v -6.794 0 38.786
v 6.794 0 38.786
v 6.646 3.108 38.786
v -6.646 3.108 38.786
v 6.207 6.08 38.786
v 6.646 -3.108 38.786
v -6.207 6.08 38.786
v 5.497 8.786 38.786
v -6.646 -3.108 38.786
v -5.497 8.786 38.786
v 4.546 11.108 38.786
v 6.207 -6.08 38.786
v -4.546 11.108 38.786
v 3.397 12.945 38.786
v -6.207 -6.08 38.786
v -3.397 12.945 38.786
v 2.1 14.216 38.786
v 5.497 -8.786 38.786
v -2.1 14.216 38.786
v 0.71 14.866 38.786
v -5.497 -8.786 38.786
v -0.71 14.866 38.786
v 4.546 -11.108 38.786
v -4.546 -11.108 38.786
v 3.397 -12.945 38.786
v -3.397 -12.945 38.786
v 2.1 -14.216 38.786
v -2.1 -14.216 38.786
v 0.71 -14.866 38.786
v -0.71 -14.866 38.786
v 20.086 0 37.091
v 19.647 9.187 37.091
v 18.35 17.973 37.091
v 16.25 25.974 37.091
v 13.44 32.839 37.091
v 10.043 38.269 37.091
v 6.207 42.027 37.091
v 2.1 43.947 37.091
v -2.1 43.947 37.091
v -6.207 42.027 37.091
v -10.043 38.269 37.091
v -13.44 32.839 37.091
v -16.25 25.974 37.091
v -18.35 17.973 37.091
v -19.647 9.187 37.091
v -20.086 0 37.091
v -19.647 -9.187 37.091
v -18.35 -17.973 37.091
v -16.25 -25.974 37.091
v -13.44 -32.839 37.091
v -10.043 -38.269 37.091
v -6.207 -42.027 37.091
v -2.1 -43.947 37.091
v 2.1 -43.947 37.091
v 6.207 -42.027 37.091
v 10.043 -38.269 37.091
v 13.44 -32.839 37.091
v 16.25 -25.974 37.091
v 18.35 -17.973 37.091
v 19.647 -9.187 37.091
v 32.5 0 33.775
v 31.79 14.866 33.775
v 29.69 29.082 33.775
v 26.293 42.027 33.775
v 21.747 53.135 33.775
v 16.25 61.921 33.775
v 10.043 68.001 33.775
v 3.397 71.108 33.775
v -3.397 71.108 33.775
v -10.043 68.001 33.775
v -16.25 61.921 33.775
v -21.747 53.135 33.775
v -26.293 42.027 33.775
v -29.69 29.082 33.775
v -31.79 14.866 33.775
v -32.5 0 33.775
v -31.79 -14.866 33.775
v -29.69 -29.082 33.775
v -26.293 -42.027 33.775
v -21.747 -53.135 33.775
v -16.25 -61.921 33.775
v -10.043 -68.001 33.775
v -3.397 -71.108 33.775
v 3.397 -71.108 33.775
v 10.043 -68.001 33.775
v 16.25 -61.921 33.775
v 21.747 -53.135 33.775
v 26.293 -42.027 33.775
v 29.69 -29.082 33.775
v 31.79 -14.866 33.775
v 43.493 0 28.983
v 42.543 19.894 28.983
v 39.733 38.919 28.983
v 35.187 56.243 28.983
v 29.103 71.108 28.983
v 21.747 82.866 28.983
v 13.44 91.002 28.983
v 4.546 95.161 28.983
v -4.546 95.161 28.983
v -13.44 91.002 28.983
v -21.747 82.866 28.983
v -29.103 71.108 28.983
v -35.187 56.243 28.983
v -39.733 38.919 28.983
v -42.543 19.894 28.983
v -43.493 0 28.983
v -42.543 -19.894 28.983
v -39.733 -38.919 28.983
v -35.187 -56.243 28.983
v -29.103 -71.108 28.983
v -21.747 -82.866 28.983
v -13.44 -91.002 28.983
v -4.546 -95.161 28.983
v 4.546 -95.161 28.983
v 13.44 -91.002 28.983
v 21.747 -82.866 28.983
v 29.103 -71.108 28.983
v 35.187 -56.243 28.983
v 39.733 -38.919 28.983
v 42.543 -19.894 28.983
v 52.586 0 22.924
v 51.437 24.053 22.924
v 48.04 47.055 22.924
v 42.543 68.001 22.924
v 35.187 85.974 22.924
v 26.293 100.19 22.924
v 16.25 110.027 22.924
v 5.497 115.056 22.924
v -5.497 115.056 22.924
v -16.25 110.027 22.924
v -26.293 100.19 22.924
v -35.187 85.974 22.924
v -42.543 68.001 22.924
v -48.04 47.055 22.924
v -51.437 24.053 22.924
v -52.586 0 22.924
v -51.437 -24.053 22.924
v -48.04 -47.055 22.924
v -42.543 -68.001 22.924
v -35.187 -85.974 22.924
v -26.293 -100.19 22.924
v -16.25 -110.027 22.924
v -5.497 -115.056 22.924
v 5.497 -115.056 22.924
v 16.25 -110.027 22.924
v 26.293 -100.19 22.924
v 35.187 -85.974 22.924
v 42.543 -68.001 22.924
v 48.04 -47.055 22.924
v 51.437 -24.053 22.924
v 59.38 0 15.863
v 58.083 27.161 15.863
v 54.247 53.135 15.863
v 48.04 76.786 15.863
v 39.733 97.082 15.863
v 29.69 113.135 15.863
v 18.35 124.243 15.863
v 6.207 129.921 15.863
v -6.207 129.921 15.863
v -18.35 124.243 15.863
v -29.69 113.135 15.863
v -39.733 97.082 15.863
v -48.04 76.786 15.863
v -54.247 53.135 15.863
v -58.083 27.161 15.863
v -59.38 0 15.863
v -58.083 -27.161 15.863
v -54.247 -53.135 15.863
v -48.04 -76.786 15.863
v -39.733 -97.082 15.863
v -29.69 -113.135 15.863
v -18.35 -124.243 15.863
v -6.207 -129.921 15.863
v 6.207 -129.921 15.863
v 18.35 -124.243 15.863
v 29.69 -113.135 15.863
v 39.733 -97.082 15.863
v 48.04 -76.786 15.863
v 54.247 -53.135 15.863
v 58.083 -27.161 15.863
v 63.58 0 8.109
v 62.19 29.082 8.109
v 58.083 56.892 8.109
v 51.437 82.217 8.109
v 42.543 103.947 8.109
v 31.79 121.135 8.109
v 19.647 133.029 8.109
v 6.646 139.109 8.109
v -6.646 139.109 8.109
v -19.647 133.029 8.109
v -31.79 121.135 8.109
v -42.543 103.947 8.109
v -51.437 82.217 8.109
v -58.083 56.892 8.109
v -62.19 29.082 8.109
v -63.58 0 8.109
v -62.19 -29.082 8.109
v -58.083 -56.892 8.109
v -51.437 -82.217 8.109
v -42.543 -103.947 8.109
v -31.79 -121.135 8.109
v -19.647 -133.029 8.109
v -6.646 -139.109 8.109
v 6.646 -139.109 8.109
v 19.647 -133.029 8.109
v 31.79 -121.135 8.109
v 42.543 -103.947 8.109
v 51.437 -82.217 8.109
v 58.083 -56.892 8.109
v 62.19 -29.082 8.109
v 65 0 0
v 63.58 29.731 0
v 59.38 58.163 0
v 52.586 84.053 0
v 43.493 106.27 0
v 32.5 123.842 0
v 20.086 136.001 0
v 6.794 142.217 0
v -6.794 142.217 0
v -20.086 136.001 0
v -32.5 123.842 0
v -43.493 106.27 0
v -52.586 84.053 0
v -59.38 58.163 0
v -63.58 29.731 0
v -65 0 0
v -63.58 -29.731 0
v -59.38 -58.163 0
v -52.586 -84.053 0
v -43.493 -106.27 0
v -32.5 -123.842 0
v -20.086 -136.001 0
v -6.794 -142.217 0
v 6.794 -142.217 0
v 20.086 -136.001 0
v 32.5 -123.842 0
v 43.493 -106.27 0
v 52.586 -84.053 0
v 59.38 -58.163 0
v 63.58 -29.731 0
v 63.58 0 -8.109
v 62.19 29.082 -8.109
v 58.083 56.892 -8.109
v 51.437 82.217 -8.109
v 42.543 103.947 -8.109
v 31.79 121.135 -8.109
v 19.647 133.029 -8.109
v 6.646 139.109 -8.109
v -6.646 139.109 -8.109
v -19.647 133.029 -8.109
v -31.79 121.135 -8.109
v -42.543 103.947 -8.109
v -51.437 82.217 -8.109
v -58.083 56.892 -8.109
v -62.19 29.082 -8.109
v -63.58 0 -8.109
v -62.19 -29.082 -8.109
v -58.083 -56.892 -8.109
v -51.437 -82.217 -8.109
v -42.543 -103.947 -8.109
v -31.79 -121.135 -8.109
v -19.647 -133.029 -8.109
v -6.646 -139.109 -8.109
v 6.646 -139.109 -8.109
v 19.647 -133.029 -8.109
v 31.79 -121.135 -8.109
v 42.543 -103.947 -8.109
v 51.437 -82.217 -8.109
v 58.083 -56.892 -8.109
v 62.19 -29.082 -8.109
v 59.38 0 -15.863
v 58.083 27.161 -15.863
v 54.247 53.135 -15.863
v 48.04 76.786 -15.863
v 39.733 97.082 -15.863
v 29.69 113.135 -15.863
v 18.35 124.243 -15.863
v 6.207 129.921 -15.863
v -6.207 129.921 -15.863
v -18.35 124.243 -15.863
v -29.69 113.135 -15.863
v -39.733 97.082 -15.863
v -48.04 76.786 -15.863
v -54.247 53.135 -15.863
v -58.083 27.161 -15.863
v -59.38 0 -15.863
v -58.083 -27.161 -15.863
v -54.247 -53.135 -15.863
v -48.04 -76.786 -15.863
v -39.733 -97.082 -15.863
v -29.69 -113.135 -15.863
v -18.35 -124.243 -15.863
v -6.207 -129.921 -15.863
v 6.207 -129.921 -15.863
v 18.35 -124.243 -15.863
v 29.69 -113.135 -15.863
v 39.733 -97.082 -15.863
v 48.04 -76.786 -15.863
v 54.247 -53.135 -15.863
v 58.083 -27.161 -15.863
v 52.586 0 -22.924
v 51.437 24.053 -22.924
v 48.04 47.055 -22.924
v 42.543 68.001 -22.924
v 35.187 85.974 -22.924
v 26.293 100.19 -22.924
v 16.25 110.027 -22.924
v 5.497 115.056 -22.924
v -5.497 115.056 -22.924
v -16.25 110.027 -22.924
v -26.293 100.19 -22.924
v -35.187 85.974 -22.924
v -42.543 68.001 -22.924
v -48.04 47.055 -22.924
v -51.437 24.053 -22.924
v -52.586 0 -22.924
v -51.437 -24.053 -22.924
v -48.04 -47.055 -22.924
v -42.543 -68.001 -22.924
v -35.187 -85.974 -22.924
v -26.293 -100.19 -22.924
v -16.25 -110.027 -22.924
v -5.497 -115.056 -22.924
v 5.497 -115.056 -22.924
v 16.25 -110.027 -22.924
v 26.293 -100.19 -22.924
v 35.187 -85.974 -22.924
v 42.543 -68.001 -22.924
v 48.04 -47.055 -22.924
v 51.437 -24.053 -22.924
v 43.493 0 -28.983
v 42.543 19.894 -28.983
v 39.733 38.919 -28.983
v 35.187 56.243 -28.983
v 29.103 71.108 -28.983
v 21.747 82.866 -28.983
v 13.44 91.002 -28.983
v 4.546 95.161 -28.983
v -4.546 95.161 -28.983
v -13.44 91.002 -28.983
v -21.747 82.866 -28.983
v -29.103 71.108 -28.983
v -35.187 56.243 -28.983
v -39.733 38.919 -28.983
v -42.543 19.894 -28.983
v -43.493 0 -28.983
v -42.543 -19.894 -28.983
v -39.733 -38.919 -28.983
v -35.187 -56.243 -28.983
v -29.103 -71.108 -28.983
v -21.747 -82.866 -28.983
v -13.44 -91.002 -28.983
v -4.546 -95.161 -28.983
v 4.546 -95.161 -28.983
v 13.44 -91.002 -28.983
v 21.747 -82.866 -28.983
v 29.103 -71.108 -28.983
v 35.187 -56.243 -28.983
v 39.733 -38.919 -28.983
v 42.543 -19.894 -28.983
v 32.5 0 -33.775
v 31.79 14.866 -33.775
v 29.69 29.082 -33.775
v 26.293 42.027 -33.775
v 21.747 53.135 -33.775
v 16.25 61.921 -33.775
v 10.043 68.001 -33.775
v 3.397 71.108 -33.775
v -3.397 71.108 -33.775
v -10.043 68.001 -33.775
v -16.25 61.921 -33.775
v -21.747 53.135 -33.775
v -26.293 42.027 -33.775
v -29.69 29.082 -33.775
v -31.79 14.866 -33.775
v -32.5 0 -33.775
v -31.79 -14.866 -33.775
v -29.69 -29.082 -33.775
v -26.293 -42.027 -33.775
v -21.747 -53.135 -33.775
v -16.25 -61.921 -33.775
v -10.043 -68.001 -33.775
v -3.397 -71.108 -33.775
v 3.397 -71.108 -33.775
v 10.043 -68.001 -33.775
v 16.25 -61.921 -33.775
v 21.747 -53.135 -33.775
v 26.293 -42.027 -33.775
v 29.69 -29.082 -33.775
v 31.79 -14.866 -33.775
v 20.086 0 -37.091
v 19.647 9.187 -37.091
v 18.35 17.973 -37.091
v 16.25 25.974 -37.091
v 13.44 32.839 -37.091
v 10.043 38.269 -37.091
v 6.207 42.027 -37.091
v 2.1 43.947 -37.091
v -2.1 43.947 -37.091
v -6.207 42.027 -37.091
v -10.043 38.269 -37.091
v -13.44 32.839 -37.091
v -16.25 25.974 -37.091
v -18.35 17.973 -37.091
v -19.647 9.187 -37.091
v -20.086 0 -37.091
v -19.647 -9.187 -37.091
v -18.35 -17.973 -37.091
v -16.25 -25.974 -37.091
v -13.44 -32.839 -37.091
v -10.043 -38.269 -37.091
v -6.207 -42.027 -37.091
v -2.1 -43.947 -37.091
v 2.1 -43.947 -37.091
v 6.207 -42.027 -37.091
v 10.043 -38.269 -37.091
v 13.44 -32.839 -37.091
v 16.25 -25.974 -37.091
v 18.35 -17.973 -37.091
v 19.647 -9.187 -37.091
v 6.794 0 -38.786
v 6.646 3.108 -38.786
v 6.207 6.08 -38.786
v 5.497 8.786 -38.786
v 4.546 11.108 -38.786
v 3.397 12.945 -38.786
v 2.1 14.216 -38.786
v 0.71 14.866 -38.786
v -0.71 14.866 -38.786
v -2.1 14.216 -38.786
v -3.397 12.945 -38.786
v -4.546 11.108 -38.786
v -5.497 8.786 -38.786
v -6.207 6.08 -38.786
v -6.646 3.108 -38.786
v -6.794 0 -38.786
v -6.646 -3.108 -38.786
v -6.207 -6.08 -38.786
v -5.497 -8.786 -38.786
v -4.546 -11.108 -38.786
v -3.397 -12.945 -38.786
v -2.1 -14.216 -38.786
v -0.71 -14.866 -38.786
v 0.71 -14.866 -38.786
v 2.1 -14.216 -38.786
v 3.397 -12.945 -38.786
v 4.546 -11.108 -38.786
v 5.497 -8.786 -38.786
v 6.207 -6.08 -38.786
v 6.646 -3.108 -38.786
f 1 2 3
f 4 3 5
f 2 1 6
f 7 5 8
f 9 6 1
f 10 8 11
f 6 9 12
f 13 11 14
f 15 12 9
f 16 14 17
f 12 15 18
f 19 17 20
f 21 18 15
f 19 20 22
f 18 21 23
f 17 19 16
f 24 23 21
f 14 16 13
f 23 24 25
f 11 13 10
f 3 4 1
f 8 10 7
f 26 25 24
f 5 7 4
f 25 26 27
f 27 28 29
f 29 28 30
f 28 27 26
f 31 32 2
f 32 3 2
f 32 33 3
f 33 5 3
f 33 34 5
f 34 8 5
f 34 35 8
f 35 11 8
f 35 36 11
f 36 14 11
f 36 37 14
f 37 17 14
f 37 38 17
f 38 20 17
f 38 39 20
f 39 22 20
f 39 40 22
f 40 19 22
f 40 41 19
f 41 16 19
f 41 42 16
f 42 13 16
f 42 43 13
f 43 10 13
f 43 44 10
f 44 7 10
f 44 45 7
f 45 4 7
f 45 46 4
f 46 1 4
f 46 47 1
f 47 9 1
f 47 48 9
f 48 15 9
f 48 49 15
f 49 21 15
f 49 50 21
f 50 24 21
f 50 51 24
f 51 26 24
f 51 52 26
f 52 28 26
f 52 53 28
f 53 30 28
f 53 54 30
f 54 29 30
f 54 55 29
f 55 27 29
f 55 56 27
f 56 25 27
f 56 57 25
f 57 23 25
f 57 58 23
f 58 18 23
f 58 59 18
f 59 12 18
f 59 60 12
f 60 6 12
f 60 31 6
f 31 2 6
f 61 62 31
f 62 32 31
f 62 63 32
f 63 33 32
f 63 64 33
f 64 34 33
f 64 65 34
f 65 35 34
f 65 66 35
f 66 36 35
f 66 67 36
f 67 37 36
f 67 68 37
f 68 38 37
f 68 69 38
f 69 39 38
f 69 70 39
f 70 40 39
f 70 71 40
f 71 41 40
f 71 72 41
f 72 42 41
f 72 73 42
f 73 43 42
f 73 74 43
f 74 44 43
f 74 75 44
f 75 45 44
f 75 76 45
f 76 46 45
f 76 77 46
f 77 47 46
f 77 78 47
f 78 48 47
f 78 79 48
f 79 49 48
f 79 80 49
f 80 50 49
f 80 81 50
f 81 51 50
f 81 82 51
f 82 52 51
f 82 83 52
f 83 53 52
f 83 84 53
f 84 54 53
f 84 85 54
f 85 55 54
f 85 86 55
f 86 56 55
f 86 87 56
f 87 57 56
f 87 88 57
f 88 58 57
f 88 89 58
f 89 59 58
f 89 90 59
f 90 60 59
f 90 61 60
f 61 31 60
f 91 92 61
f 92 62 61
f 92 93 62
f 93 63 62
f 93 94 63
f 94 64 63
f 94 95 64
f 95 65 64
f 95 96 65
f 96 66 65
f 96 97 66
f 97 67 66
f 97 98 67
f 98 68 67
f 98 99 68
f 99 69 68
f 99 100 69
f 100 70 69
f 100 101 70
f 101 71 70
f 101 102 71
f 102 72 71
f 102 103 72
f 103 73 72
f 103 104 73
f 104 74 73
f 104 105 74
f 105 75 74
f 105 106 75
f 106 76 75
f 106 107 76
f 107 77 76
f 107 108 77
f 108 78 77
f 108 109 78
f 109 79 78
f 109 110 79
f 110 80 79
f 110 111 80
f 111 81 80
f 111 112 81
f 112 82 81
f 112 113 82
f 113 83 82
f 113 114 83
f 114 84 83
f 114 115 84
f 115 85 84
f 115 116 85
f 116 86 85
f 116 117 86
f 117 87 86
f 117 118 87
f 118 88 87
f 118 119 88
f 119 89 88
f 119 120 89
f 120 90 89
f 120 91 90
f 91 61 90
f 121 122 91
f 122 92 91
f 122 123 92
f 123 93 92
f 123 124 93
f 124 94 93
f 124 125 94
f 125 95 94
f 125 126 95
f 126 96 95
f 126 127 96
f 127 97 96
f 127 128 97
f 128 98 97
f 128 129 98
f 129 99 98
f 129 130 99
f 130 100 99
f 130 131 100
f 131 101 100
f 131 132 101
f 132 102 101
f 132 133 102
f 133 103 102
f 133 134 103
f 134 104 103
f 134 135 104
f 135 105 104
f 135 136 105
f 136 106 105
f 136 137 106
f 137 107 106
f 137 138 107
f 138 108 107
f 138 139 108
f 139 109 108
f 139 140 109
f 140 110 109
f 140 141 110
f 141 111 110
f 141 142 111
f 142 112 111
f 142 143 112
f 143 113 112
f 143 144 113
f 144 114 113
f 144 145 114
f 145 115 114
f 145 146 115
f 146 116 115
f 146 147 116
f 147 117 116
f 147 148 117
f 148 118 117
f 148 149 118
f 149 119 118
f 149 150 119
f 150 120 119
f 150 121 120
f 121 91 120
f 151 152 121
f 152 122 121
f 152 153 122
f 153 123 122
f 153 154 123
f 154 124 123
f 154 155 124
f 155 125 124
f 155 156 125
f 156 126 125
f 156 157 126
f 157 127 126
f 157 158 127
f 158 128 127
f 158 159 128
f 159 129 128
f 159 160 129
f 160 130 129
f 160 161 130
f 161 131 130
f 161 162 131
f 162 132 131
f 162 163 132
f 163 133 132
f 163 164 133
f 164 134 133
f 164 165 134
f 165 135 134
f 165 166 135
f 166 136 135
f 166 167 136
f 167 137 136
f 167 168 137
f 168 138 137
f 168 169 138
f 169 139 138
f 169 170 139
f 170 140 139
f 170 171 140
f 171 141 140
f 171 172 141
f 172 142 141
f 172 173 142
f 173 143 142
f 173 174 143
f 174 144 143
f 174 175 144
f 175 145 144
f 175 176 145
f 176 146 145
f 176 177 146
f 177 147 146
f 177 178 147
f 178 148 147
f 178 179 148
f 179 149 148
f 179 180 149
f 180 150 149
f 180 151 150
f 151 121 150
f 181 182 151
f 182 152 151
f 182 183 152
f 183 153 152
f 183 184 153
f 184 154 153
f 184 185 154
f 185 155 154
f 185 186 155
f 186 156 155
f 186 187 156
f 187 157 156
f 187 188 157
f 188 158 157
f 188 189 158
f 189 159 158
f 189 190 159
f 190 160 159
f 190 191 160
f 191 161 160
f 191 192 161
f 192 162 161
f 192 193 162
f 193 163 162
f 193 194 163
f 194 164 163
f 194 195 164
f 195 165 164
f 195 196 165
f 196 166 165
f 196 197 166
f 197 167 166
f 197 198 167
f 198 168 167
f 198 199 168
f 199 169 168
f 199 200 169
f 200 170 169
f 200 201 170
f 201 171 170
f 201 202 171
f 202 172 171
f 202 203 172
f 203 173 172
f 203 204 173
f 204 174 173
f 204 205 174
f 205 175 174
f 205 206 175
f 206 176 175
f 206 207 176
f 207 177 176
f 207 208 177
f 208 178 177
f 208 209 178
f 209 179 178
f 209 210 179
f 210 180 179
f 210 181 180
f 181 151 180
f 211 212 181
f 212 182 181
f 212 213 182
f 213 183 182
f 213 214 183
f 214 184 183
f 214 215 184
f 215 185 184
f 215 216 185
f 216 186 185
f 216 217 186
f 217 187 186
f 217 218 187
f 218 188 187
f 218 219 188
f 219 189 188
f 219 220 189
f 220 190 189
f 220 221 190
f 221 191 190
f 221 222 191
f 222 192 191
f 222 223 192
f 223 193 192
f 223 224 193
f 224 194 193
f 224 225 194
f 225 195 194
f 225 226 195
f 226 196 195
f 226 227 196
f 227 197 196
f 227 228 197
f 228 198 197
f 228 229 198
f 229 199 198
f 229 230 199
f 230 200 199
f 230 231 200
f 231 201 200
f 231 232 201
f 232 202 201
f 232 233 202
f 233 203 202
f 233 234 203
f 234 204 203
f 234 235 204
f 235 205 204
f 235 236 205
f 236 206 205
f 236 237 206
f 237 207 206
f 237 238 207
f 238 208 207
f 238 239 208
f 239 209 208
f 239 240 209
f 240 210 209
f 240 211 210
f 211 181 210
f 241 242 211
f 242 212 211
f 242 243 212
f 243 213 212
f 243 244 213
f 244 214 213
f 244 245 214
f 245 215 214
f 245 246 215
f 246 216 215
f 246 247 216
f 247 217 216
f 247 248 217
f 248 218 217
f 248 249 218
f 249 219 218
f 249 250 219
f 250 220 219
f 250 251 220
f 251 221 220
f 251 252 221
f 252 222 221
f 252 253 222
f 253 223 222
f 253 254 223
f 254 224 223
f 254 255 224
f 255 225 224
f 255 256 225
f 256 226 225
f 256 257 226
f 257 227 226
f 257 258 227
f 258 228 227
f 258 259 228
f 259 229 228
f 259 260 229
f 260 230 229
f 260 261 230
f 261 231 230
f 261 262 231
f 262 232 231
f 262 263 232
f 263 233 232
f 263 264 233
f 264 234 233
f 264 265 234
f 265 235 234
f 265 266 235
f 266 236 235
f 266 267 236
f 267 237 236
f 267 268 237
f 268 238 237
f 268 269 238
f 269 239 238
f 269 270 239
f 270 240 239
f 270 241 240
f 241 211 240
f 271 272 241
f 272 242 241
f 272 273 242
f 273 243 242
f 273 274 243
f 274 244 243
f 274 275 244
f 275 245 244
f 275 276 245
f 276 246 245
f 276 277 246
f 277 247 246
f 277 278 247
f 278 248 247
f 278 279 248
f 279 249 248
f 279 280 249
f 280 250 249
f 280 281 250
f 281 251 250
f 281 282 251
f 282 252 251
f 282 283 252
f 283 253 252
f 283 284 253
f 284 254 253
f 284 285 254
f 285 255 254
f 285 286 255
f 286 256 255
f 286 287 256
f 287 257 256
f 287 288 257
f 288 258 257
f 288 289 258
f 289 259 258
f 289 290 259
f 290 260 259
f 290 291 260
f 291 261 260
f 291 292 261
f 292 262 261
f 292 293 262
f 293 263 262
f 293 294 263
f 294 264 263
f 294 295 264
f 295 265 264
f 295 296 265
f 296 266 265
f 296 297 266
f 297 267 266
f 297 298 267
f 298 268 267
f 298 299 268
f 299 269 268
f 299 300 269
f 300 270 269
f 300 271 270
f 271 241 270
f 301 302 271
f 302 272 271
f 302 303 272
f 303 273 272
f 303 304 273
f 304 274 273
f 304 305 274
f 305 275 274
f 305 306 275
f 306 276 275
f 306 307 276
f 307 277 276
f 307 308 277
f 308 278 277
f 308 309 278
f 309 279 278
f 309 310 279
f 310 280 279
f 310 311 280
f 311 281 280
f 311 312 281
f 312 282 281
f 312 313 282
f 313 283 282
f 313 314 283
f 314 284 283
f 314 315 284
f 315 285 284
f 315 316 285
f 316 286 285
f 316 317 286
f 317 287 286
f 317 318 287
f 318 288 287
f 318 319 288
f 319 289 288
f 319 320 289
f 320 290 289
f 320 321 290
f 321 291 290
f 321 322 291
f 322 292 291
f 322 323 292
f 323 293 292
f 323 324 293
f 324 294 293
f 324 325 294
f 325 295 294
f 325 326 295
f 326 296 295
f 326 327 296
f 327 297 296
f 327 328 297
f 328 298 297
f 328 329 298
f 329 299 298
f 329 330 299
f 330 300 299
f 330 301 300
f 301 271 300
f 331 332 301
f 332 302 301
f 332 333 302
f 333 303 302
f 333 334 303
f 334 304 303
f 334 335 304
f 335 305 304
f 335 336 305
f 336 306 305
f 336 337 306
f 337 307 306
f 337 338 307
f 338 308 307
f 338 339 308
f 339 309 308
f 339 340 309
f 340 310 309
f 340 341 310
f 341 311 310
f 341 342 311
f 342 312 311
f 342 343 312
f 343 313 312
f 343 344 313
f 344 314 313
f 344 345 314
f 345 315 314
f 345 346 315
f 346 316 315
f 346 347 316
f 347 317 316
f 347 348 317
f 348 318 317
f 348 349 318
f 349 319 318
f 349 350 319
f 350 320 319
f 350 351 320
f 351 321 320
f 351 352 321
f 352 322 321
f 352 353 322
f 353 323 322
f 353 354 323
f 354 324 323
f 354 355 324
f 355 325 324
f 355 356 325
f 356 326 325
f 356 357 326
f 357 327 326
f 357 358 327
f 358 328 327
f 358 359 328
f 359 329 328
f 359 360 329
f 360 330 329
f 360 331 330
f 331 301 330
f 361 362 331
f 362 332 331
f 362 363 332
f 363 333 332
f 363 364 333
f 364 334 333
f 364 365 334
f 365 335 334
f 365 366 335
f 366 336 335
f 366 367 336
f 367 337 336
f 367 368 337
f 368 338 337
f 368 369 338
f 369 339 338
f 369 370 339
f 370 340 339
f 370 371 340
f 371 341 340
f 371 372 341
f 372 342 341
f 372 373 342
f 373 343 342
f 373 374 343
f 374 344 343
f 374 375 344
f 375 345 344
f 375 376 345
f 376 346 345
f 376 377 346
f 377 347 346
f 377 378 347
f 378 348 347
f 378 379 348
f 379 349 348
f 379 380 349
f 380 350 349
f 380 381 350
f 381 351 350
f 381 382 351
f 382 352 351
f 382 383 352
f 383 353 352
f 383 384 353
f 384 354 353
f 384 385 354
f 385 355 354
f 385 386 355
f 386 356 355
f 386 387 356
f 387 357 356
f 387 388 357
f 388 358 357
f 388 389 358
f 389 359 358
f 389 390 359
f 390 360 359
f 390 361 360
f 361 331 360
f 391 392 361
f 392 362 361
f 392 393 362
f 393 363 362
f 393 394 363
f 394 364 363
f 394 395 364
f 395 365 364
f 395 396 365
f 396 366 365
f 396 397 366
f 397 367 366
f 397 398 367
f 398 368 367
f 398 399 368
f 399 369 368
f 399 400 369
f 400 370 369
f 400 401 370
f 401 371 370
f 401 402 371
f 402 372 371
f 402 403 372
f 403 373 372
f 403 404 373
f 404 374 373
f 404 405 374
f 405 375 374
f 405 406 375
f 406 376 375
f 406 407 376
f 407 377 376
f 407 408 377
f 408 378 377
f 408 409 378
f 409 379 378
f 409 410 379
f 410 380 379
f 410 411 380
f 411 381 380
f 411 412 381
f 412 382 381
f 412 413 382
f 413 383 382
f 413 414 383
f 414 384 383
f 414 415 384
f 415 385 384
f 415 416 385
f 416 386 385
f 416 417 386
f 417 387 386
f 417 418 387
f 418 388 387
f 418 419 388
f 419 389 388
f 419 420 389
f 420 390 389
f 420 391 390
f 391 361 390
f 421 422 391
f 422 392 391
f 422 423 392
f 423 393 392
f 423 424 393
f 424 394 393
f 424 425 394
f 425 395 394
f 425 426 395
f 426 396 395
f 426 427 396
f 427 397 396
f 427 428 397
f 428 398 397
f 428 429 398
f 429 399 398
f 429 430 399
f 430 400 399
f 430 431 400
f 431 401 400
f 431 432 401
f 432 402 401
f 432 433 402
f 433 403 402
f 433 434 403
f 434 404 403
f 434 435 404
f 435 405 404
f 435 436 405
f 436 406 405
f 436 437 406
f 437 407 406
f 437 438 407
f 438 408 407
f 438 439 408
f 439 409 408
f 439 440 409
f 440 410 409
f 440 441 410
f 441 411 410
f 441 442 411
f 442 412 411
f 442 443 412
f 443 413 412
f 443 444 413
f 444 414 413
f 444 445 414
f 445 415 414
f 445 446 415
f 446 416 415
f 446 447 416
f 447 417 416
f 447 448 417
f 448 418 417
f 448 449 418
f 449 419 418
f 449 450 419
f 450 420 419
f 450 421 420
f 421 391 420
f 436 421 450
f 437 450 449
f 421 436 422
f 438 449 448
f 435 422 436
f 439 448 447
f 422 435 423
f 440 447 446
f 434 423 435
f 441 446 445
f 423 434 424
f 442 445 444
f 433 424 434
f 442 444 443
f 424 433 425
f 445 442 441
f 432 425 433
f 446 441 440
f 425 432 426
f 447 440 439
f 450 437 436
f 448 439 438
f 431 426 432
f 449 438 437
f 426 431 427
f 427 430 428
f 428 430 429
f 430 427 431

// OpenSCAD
// Generated by SolidPython 1.0.1 on 2020-07-29 00:46:46


scale(v = [5, 11, 3]) {
	sphere(r = 13);
}
/***********************************************
*********      SolidPython code:      **********
************************************************
 
# import packages: SolidPython
from solid import *
from solid.utils import *
from itertools import chain, combinations, permutations


class Resize:

    def __init__(self, scad_file):
        self.scad_file = scad_file
        #self.scad_file = import_scad(scad_file)
        # cone/cylinder param:
        self.r1 = 0
        self.r2 = 0
        self.h = 0
        # rectangular prism param:
        self.w = 0
        self.l = 0
        # ellipse param:
        self.r = 0

    # import OpenScad code (file name corresponds to shape)


    # classify shape + parameters
    def assign(self, param1, param2, param3):
        if self.scad_file == 'cone.scad':
            self.r1 = param1
            self.r2 = param2
            self.h = param3
        elif self.scad_file == 'cylinder.scad':
            self.r1 = param1
            self.r2 = param2
            self.h = param3
        elif self.scad_file == 'rectangularPrism.scad':
            self.h = param1
            self.l = param2
            self.w = param3
        else:
            self.r = param1
            self.h = param2

    # resize parameters
    def iterate(self):
        x = range(3, 20, 2)
        i = 1
        if self.scad_file == 'cone.scad':
            tempList = list(permutations(x, 2))
            for temp in tempList:
                param1 = temp[0]
                param2 = temp[1]
                filepath = 'produced_scad_files/' + 'cone' + str(param1) + '_' + str(param2) + '_' + '.scad'
                scad_render_to_file(cylinder(h=param1, r1=param2, r2=0), filepath)

        elif self.scad_file == 'cylinder.scad':
            tempList = list(permutations(x, 3))
            for temp in tempList:
                param1 = temp[0]
                param2 = temp[1]
                filepath = 'produced_scad_files/' + 'cylinder' + str(param1) + '_' + str(param2) + '_' + '.scad'
                scad_render_to_file(cylinder(h=param1, r1=param2, r2=param2), filepath)

        elif self.scad_file == 'rectangularPrism.scad':
            tempList = list(permutations(x, 3))
            for temp in tempList:
                param1 = temp[0]
                param2 = temp[1]
                param3 = temp[2]
                filepath = 'produced_scad_files/' + 'rectangularPrism' + str(param1) + '_' + str(param2) + '_' + str(
                    param3) + '.scad'
                scad_render_to_file(cube(size=(param1, param2, param3)), filepath)

        elif self.scad_file == 'ellipse.scad':
            tempList = list(permutations(x, 4))
            for temp in tempList:
                param1 = temp[0]
                param2 = temp[1]
                param3 = temp[2]
                param4 = temp[3]
                filepath = 'produced_scad_files/' + 'ellipse' + str(param1) + '_' + str(param2) + '_' + str(param3) + '_' + str(param4) + '.scad'
                scad_render_to_file(scale([param1, param2, param3])(sphere(r=param4)), filepath)

    def render_to_scadfile(self):
        scad_render_to_file(scad, 'example.scad') 
 
************************************************/
